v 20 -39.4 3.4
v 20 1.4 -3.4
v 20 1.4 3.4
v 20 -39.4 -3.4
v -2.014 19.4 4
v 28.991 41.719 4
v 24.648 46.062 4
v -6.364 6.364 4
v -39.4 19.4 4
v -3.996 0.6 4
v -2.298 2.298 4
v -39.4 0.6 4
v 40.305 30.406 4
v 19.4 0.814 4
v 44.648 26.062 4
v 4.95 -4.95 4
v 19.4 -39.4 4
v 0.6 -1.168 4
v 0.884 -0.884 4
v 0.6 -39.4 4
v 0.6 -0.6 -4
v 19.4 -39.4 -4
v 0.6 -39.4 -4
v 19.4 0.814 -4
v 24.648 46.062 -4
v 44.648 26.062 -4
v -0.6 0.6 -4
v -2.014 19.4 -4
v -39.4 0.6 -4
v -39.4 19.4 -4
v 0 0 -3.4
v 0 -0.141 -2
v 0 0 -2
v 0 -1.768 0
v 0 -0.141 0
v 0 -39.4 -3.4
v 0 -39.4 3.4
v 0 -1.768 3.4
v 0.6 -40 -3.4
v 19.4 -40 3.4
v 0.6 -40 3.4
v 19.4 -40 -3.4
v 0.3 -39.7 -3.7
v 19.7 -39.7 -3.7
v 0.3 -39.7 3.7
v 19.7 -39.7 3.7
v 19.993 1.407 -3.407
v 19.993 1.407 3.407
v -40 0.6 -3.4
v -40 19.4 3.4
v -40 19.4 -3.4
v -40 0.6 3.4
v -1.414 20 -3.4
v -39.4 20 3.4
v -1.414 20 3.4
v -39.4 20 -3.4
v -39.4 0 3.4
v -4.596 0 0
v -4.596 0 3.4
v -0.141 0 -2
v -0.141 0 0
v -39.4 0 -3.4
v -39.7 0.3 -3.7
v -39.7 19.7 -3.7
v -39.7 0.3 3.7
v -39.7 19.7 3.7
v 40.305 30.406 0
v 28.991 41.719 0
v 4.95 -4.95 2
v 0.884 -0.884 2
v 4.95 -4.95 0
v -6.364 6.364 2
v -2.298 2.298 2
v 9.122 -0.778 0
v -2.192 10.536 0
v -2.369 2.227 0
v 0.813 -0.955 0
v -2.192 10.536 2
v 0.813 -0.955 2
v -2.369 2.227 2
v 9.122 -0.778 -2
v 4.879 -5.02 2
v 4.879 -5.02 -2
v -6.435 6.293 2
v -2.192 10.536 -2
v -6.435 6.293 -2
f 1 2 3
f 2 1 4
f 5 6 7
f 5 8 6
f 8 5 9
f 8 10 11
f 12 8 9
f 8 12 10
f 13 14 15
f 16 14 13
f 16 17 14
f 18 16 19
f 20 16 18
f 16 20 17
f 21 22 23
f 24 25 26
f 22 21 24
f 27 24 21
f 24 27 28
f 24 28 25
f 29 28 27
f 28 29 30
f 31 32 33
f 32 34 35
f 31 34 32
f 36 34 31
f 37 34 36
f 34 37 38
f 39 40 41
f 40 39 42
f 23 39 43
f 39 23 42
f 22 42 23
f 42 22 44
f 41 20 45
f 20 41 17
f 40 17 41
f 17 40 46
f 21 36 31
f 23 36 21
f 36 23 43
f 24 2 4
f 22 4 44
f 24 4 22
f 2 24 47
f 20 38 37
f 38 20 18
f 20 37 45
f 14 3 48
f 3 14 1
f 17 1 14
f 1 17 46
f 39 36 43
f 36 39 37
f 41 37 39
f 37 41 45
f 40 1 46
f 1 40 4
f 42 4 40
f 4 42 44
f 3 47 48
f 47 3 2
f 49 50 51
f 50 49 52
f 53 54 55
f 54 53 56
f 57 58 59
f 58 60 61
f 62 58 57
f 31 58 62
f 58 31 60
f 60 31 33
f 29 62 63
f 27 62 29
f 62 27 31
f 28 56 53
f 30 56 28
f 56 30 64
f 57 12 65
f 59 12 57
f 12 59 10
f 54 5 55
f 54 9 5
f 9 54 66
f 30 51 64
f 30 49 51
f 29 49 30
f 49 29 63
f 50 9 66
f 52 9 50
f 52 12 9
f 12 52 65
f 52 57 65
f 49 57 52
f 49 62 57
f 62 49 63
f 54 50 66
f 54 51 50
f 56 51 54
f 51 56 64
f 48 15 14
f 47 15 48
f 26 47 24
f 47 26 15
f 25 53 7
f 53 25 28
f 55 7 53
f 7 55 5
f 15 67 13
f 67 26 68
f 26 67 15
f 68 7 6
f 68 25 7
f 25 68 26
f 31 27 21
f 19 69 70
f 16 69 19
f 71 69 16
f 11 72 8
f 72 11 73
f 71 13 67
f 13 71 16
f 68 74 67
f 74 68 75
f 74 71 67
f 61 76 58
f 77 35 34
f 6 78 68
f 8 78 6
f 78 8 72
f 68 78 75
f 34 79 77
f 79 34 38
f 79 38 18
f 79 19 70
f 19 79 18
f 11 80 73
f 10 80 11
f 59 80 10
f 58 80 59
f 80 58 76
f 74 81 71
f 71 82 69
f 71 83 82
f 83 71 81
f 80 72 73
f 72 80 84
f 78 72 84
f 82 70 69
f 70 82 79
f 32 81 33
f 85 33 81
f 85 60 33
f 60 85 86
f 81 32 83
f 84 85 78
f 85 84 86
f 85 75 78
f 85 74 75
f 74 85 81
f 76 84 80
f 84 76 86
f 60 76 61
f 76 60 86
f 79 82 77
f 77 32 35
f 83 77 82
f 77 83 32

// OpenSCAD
//Originally from https://www.printables.com/model/14474-radius-gauge-for-calipers

rotate(a=180,v=[1000,0,0]){
  color([0.8,0.2,0.8,1]){
    rotate(a=180,v=[1000,0,0]){
      difference(){
        difference(){
          difference(){
            group(){
              translate([0,2,0]){
                translate([10,-21,0]){
                  difference(){
                    difference(){     
                      difference(){
                        difference(){
                          difference(){
                            difference(){
                              difference(){
                                difference(){
                                  difference(){
                                    difference(){
                                      difference(){
                                        difference(){
                                          cube([20,42,8],center=true);
                                          translate([-10,-20.4,-4]){
                                            multmatrix(m=[[-1,-0,0,0],[-0,0.707107,-0.707107,0],[0,-0.707107,-0.707107,0],[0,0,0,1]]){
                                              translate([0,0,0.6]){
                                                cube([80.072,80.072,1.2],center=true);
                                              }
                                            }
                                          }
                                        }
                                        translate([-10,21,-3.4]){
                                          multmatrix(m=[[1,-0,0,0],[-0,-0.707107,0.707107,0],[0,-0.707107,-0.707107,0],[0,0,0,1]]){
                                            translate([0,0,0.6]){
                                              cube([80.072,80.072,1.2],center=true);
                                            }
                                          }
                                        }
                                      }
                                      translate([-10,-21,3.4]){
                                        multmatrix(m=[[-1,0,0,0],[-0,-0.707107,-0.707107,0],[0,-0.707107,0.707107,0],[0,0,0,1]]){
                                          translate([0,0,0.6]){
                                            cube([80.072,80.072,1.2],center=true);
                                          }
                                        }
                                      }
                                    }
                                    translate([-10,20.4,4]){
                                      multmatrix(m=[[1,0,0,0],[-0,0.707107,0.707107,0],[0,-0.707107,0.707107,0],[0,0,0,1]]){
                                        translate([0,0,0.6]){
                                          cube([80.072,80.072,1.2],center=true);
                                        }
                                      }
                                    }
                                  }
                                  translate([-10,-21,-3.4]){
                                    multmatrix(m=[[0,0.707107,-0.707107,0],[1,-0,0,0],[0,-0.707107,-0.707107,0],[0,0,0,1]]){
                                      translate([0,0,0.6]){
                                        cube([168.034,168.034,1.2],center=true);
                                      }
                                    }
                                  }
                                }
                                translate([9.4,-21,-4]){
                                  multmatrix(m=[[0,-0.707107,0.707107,0],[-1,-0,0,0],[0,-0.707107,-0.707107,0],[0,0,0,1]]){
                                    translate([0,0,0.6]){
                                      cube([168.034,168.034,1.2],center=true);
                                    }
                                  }
                                }
                              }
                              translate([-9.4,-21,4]){
                                multmatrix(m=[[0,-0.707107,-0.707107,0],[1,0,0,0],[0,-0.707107,0.707107,0],[0,0,0,1]]){
                                  translate([0,0,0.6]){
                                    cube([168.034,168.034,1.2],center=true);
                                  }
                                }
                              }
                            }
                            translate([10,-21,3.4]){
                              multmatrix(m=[[0,0.707107,0.707107,0],[-1,0,0,0],[0,-0.707107,0.707107,0],[0,0,0,1]]){
                                translate([0,0,0.6]){
                                  cube([168.034,168.034,1.2],center=true);
                                }
                              }
                            }
                          }
                          translate([-9.4,-21,-4]){
                            multmatrix(m=[[-0.707107,-0,-0.707107,0],[0.707107,-0,-0.707107,0],[0,-1,0,0],[0,0,0,1]]){
                              translate([0,0,0.6]){
                                cube([32.1795,32.1795,1.2],center=true);
                              }
                            }
                          }
                        }
                        translate([10,-20.4,-4]){
                          multmatrix(m=[[-0.707107,0,0.707107,0],[-0.707107,-0,-0.707107,0],[0,-1,0,0],[0,0,0,1]]){
                            translate([0,0,0.6]){
                              cube([32.1795,32.1795,1.2],center=true);
                            }
                          }
                        }
                      }
                      translate([-10,20.4,-4]){
                        multmatrix(m=[[0.707107,-0,-0.707107,0],[0.707107,0,0.707107,0],[0,-1,0,0],[0,0,0,1]]){
                          translate([0,0,0.6]){
                            cube([32.1795,32.1795,1.2],center=true);
                          }
                        }
                      }
                    }
                    translate([9.4,21,-4]){
                      multmatrix(m=[[0.707107,0,0.707107,0],[-0.707107,0,0.707107,0],[0,-1,0,0],[0,0,0,1]]){
                        translate([0,0,0.6]){
                          cube([32.1795,32.1795,1.2],center=true);
                        }
                      }
                    }
                  }
                }
              }
              translate([2,0,0]){
                translate([-21,10,0]){
                  difference(){
                    difference(){
                      difference(){
                        difference(){
                          difference(){
                            difference(){
                              difference(){
                                difference(){
                                  difference(){
                                    difference(){
                                      difference(){
                                        difference(){
                                          cube([42,20,8],center=true);
                                          translate([-21,-9.4,-4]){
                                            multmatrix(m=[[-1,-0,0,0],[-0,0.707107,-0.707107,0],[0,-0.707107,-0.707107,0],[0,0,0,1]]){
                                              translate([0,0,0.6]){
                                                cube([168.034,168.034,1.2],center=true);
                                              }
                                            }
                                          }
                                        }
                                        translate([-21,10,-3.4]){
                                          multmatrix(m=[[1,-0,0,0],[-0,-0.707107,0.707107,0],[0,-0.707107,-0.707107,0],[0,0,0,1]]){
                                            translate([0,0,0.6]){
                                              cube([168.034,168.034,1.2],center=true);
                                            }
                                          }
                                        }
                                      }
                                      translate([-21,-10,3.4]){
                                        multmatrix(m=[[-1,0,0,0],[-0,-0.707107,-0.707107,0],[0,-0.707107,0.707107,0],[0,0,0,1]]){
                                          translate([0,0,0.6]){
                                            cube([168.034,168.034,1.2],center=true);
                                          }
                                        }
                                      }
                                    }
                                    translate([-21,9.4,4]){
                                      multmatrix(m=[[1,0,0,0],[-0,0.707107,0.707107,0],[0,-0.707107,0.707107,0],[0,0,0,1]]){
                                        translate([0,0,0.6]){
                                          cube([168.034,168.034,1.2],center=true);
                                        }
                                      }
                                    }
                                  }
                                  translate([-21,-10,-3.4]){
                                    multmatrix(m=[[0,0.707107,-0.707107,0],[1,-0,0,0],[0,-0.707107,-0.707107,0],[0,0,0,1]]){
                                      translate([0,0,0.6]){
                                        cube([80.072,80.072,1.2],center=true);
                                      }
                                    }
                                  }
                                }
                                translate([20.4,-10,-4]){
                                  multmatrix(m=[[0,-0.707107,0.707107,0],[-1,-0,0,0],[0,-0.707107,-0.707107,0],[0,0,0,1]]){
                                    translate([0,0,0.6]){
                                      cube([80.072,80.072,1.2],center=true);
                                    }
                                  }
                                }
                              }
                              translate([-20.4,-10,4]){
                                multmatrix(m=[[0,-0.707107,-0.707107,0],[1,0,0,0],[0,-0.707107,0.707107,0],[0,0,0,1]]){
                                  translate([0,0,0.6]){
                                    cube([80.072,80.072,1.2],center=true);
                                  }
                                }
                              }
                            }
                            translate([21,-10,3.4]){
                              multmatrix(m=[[0,0.707107,0.707107,0],[-1,0,0,0],[0,-0.707107,0.707107,0],[0,0,0,1]]){
                                translate([0,0,0.6]){
                                  cube([80.072,80.072,1.2],center=true);
                                }
                              }
                            }
                          }
                          translate([-20.4,-10,-4]){
                            multmatrix(m=[[-0.707107,-0,-0.707107,0],[0.707107,-0,-0.707107,0],[0,-1,0,0],[0,0,0,1]]){
                              translate([0,0,0.6]){
                                cube([32.1795,32.1795,1.2],center=true);
                              }
                            }
                          }
                        }
                        translate([21,-9.4,-4]){
                          multmatrix(m=[[-0.707107,0,0.707107,0],[-0.707107,-0,-0.707107,0],[0,-1,0,0],[0,0,0,1]]){
                            translate([0,0,0.6]){
                              cube([32.1795,32.1795,1.2],center=true);
                            }
                          }
                        }
                      }
                      translate([-21,9.4,-4]){
                        multmatrix(m=[[0.707107,-0,-0.707107,0],[0.707107,0,0.707107,0],[0,-1,0,0],[0,0,0,1]]){
                          translate([0,0,0.6]){
                            cube([32.1795,32.1795,1.2],center=true);
                          }
                        }
                      }
                    }
                    translate([20.4,10,-4]){
                      multmatrix(m=[[0.707107,0,0.707107,0],[-0.707107,0,0.707107,0],[0,-1,0,0],[0,0,0,1]]){
                        translate([0,0,0.6]){
                          cube([32.1795,32.1795,1.2],center=true);
                        }
                      }
                    }
                  }
                }
              }
              rotate(a=-45,v=[0,0,1000]){
                translate([-1,0,0]){
                  translate([0,25,0]){
                    cube([28.2843,50,8],center=true);
                  }
                }
              }
            }
            rotate(a=-45,v=[0,0,1000]){
              translate([-1,0,0]){
                translate([0,50,50]){
                  cube([16,100,100],center=true);
                }
              }
            }
          }
          rotate(a=-45,v=[0,0,1000]){
            translate([-1,0,0]){
              translate([0,0,50]){
                cube([4.5,100,100],center=true);
              }
            }
          }
        }
        rotate(a=-45,v=[0,0,1000]){
          translate([-1,0,0]){
            translate([0,-0.1,0]){
              translate([0,3,0]){
                cube([16,6,4],center=true);
              }
            }
          }
        }
      }
    }
  }
}
